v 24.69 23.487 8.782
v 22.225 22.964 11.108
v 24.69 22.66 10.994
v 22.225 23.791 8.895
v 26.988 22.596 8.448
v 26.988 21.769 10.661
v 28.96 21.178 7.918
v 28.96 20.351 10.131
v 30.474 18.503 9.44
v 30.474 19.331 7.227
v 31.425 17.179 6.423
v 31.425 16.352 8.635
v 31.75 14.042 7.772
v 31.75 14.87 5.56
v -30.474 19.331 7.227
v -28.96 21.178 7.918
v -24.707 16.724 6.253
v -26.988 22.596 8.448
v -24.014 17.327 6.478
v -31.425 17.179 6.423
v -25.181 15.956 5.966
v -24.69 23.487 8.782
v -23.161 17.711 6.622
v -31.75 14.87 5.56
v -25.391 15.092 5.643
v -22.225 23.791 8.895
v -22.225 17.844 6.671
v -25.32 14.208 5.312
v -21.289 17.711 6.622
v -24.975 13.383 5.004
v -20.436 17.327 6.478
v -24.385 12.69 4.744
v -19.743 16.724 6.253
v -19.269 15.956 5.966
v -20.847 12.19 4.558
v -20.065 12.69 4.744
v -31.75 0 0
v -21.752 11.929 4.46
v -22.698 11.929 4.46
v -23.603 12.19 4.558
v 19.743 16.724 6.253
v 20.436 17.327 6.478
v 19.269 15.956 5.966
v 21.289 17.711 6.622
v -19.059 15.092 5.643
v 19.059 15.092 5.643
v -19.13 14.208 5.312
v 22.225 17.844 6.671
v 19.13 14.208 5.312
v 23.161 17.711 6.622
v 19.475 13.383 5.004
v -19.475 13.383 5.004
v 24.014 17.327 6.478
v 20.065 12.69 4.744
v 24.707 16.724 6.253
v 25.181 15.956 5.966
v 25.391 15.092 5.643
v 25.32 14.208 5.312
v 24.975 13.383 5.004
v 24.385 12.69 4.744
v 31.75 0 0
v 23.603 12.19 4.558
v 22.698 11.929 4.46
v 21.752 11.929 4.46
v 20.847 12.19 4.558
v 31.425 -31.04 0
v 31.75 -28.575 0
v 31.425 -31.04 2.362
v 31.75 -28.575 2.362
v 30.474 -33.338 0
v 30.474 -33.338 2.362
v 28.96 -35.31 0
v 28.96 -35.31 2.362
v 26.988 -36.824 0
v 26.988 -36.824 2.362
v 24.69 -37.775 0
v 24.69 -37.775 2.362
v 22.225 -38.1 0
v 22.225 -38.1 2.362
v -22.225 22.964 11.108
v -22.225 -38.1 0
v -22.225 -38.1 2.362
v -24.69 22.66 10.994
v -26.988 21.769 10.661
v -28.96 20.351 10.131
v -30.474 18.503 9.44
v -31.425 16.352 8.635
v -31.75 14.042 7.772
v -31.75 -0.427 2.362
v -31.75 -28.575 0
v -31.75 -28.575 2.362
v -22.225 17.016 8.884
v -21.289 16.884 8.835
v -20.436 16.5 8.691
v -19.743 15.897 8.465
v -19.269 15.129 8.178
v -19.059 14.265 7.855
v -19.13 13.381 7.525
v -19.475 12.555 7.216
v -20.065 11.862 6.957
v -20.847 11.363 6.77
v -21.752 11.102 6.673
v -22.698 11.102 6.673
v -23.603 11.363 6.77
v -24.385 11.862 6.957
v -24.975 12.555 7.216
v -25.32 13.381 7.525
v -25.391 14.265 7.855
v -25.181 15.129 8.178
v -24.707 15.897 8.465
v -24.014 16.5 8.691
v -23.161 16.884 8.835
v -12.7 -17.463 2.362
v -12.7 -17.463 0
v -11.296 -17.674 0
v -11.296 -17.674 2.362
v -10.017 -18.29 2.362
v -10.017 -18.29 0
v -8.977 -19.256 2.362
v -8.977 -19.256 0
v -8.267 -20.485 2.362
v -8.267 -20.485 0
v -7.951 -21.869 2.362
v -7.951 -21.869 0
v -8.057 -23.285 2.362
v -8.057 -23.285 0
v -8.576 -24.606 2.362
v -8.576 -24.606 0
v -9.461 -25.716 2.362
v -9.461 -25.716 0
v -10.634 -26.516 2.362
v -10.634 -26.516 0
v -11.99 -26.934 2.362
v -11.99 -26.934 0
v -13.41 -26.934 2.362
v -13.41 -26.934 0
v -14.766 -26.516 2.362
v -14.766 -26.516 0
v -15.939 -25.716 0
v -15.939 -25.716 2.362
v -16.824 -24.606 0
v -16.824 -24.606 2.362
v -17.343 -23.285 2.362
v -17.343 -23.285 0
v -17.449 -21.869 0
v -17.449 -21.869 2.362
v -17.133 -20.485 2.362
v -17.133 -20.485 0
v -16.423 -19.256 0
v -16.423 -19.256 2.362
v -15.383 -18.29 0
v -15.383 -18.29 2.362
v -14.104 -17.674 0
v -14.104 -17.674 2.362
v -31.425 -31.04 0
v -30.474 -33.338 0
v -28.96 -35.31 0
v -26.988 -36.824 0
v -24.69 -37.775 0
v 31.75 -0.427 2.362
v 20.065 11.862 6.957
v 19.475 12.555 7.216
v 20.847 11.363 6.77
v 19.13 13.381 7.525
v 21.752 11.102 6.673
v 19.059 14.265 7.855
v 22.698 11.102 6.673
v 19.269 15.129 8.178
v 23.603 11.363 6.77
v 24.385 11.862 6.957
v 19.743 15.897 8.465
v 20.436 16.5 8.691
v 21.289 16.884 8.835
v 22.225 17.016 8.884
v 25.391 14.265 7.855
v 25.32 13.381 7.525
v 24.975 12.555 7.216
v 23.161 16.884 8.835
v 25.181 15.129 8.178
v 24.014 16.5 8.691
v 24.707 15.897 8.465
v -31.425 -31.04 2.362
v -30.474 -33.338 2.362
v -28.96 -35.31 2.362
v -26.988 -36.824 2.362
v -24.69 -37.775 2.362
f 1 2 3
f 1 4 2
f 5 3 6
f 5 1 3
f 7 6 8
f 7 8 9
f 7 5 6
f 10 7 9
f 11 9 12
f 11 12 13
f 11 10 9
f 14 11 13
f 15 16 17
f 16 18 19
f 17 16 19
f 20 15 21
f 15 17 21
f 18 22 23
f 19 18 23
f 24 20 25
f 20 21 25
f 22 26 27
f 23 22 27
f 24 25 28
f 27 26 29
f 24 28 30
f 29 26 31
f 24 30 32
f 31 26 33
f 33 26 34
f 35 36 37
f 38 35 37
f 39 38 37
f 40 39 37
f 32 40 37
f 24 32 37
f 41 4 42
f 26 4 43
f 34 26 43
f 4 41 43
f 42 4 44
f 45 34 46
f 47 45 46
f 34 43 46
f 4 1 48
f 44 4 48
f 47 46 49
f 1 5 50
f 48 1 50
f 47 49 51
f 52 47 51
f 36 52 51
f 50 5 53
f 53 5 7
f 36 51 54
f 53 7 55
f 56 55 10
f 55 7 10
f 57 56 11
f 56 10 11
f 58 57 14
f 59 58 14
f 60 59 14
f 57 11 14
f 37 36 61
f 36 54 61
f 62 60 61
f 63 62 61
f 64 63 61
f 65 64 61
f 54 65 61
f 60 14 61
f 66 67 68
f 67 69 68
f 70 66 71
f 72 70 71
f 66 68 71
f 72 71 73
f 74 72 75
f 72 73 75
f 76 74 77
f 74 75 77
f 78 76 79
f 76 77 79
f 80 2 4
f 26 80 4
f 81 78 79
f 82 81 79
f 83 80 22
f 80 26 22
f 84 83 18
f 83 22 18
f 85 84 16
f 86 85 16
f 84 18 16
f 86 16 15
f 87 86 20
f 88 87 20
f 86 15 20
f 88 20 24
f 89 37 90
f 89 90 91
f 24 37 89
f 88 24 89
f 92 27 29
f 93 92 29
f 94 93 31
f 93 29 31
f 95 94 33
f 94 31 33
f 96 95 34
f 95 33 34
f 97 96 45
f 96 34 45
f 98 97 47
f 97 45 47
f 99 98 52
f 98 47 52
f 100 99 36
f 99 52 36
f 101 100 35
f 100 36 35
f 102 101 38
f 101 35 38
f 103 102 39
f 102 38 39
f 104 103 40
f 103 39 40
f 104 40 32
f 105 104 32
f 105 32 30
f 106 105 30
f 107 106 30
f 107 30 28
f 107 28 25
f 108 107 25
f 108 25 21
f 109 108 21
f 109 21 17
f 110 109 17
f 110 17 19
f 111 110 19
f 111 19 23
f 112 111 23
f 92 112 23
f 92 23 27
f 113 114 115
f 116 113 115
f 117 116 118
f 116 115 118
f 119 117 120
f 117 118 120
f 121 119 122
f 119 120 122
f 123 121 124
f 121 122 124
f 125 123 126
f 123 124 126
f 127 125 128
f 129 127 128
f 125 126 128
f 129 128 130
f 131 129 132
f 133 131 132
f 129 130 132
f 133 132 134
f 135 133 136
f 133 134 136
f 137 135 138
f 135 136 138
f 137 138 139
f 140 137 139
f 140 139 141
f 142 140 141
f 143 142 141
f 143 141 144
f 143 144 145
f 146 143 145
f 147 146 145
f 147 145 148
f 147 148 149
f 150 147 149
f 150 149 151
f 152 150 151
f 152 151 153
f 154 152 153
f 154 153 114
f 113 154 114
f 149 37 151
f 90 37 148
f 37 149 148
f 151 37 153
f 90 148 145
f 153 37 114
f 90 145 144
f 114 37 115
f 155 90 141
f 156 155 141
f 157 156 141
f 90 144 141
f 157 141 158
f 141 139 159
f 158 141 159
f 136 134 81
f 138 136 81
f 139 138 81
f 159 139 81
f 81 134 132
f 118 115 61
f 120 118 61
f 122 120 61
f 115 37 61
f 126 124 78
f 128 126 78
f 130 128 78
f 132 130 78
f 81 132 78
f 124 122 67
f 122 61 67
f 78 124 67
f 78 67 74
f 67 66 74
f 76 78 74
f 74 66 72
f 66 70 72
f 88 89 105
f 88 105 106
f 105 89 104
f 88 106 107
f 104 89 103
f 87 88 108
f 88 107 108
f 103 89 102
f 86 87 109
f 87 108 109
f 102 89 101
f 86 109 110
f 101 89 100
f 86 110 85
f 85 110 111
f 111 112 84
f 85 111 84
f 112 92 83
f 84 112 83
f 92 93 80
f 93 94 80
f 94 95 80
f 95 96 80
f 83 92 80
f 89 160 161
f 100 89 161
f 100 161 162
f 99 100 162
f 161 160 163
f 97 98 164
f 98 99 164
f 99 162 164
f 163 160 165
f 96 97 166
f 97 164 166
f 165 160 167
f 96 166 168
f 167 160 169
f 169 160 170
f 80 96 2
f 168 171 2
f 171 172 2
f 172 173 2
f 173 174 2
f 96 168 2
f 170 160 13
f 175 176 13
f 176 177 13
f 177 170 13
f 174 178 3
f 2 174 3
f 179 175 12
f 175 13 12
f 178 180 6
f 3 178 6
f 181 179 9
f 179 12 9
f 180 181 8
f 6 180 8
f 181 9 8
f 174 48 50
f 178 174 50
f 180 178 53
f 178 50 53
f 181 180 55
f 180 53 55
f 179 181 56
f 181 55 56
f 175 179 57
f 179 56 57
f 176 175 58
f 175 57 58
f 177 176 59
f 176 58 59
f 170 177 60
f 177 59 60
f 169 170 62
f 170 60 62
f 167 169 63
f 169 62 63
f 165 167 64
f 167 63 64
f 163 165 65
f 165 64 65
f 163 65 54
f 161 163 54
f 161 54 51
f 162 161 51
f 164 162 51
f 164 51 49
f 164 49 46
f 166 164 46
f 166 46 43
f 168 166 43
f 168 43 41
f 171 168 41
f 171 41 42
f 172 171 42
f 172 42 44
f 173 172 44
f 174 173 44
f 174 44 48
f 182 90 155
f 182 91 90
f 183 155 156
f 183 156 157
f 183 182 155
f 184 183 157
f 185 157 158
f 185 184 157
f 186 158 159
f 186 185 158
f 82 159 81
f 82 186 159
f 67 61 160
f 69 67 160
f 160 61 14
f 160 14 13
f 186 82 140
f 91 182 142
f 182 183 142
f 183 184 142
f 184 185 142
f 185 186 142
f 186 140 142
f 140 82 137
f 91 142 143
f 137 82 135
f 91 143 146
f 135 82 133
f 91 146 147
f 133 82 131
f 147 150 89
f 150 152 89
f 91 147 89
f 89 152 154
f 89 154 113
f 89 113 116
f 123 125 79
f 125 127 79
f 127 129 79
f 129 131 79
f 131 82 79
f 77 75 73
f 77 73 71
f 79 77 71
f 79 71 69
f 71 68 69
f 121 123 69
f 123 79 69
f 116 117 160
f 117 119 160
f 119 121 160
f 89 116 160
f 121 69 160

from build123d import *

# Parameters (mm, degrees)
EXTRUDE_THIN1_DEPTH = 31.75
SKETCH2_R           = 4.7625
CUT_EXTRUDE1_DEPTH  = 51.823787507
SKETCH3_R           = 3.175
CUT_EXTRUDE2_DEPTH  = 51.823787507
FILLET1_R           = 9.525


with BuildPart() as part:
    # Sketch1 → Extrude-Thin1 (new, symmetric)
    with BuildSketch(Plane(origin=(0, 0, 0), x_dir=(0, 0, -1), z_dir=(1, 0, 0))):
        Polygon((-8.895267484, 23.791473607), (0, 0), (0, -38.1), (-2.3622, -38.1), (-2.3622, -0.427155344), (-11.107874529, 22.964213731), align=None)
    extrude(amount=EXTRUDE_THIN1_DEPTH, both=True)

    # Sketch2 → Cut-Extrude1 (cut, through all)
    with BuildSketch(Plane(origin=(0, 0, 0), x_dir=(-1, 0, 0), z_dir=(0, 0, -1))):
        with Locations(Location((12.7, -22.225, 0), (0, 0, 90))):
            Circle(SKETCH2_R)
    extrude(amount=-CUT_EXTRUDE1_DEPTH, mode=Mode.SUBTRACT)

    # Sketch3 → Cut-Extrude2 (cut, through all)
    with BuildSketch(Plane(origin=(0, 0, 0), x_dir=(-1, 0, 0), z_dir=(0, 0.35020738125946876, -0.9366721892483971))):
        with Locations(Location((-22.225, 15.875, 0), (0, 0, 90))):
            Circle(SKETCH3_R)
        with Locations(Location((22.225, 15.875, 0), (0, 0, 90))):
            Circle(SKETCH3_R)
    extrude(amount=-CUT_EXTRUDE2_DEPTH, mode=Mode.SUBTRACT)

    # Fillet1
    fillet1_edges = [part.edges().sort_by_distance(p)[0] for p in [
        (31.75, 23.377843669, 10.001571007),
        (-31.75, 23.377843669, 10.001571007),
        (-31.75, -38.1, 1.1811),
        (31.75, -38.1, 1.1811),
    ]]
    fillet(fillet1_edges, radius=FILLET1_R)


solid = part.part
